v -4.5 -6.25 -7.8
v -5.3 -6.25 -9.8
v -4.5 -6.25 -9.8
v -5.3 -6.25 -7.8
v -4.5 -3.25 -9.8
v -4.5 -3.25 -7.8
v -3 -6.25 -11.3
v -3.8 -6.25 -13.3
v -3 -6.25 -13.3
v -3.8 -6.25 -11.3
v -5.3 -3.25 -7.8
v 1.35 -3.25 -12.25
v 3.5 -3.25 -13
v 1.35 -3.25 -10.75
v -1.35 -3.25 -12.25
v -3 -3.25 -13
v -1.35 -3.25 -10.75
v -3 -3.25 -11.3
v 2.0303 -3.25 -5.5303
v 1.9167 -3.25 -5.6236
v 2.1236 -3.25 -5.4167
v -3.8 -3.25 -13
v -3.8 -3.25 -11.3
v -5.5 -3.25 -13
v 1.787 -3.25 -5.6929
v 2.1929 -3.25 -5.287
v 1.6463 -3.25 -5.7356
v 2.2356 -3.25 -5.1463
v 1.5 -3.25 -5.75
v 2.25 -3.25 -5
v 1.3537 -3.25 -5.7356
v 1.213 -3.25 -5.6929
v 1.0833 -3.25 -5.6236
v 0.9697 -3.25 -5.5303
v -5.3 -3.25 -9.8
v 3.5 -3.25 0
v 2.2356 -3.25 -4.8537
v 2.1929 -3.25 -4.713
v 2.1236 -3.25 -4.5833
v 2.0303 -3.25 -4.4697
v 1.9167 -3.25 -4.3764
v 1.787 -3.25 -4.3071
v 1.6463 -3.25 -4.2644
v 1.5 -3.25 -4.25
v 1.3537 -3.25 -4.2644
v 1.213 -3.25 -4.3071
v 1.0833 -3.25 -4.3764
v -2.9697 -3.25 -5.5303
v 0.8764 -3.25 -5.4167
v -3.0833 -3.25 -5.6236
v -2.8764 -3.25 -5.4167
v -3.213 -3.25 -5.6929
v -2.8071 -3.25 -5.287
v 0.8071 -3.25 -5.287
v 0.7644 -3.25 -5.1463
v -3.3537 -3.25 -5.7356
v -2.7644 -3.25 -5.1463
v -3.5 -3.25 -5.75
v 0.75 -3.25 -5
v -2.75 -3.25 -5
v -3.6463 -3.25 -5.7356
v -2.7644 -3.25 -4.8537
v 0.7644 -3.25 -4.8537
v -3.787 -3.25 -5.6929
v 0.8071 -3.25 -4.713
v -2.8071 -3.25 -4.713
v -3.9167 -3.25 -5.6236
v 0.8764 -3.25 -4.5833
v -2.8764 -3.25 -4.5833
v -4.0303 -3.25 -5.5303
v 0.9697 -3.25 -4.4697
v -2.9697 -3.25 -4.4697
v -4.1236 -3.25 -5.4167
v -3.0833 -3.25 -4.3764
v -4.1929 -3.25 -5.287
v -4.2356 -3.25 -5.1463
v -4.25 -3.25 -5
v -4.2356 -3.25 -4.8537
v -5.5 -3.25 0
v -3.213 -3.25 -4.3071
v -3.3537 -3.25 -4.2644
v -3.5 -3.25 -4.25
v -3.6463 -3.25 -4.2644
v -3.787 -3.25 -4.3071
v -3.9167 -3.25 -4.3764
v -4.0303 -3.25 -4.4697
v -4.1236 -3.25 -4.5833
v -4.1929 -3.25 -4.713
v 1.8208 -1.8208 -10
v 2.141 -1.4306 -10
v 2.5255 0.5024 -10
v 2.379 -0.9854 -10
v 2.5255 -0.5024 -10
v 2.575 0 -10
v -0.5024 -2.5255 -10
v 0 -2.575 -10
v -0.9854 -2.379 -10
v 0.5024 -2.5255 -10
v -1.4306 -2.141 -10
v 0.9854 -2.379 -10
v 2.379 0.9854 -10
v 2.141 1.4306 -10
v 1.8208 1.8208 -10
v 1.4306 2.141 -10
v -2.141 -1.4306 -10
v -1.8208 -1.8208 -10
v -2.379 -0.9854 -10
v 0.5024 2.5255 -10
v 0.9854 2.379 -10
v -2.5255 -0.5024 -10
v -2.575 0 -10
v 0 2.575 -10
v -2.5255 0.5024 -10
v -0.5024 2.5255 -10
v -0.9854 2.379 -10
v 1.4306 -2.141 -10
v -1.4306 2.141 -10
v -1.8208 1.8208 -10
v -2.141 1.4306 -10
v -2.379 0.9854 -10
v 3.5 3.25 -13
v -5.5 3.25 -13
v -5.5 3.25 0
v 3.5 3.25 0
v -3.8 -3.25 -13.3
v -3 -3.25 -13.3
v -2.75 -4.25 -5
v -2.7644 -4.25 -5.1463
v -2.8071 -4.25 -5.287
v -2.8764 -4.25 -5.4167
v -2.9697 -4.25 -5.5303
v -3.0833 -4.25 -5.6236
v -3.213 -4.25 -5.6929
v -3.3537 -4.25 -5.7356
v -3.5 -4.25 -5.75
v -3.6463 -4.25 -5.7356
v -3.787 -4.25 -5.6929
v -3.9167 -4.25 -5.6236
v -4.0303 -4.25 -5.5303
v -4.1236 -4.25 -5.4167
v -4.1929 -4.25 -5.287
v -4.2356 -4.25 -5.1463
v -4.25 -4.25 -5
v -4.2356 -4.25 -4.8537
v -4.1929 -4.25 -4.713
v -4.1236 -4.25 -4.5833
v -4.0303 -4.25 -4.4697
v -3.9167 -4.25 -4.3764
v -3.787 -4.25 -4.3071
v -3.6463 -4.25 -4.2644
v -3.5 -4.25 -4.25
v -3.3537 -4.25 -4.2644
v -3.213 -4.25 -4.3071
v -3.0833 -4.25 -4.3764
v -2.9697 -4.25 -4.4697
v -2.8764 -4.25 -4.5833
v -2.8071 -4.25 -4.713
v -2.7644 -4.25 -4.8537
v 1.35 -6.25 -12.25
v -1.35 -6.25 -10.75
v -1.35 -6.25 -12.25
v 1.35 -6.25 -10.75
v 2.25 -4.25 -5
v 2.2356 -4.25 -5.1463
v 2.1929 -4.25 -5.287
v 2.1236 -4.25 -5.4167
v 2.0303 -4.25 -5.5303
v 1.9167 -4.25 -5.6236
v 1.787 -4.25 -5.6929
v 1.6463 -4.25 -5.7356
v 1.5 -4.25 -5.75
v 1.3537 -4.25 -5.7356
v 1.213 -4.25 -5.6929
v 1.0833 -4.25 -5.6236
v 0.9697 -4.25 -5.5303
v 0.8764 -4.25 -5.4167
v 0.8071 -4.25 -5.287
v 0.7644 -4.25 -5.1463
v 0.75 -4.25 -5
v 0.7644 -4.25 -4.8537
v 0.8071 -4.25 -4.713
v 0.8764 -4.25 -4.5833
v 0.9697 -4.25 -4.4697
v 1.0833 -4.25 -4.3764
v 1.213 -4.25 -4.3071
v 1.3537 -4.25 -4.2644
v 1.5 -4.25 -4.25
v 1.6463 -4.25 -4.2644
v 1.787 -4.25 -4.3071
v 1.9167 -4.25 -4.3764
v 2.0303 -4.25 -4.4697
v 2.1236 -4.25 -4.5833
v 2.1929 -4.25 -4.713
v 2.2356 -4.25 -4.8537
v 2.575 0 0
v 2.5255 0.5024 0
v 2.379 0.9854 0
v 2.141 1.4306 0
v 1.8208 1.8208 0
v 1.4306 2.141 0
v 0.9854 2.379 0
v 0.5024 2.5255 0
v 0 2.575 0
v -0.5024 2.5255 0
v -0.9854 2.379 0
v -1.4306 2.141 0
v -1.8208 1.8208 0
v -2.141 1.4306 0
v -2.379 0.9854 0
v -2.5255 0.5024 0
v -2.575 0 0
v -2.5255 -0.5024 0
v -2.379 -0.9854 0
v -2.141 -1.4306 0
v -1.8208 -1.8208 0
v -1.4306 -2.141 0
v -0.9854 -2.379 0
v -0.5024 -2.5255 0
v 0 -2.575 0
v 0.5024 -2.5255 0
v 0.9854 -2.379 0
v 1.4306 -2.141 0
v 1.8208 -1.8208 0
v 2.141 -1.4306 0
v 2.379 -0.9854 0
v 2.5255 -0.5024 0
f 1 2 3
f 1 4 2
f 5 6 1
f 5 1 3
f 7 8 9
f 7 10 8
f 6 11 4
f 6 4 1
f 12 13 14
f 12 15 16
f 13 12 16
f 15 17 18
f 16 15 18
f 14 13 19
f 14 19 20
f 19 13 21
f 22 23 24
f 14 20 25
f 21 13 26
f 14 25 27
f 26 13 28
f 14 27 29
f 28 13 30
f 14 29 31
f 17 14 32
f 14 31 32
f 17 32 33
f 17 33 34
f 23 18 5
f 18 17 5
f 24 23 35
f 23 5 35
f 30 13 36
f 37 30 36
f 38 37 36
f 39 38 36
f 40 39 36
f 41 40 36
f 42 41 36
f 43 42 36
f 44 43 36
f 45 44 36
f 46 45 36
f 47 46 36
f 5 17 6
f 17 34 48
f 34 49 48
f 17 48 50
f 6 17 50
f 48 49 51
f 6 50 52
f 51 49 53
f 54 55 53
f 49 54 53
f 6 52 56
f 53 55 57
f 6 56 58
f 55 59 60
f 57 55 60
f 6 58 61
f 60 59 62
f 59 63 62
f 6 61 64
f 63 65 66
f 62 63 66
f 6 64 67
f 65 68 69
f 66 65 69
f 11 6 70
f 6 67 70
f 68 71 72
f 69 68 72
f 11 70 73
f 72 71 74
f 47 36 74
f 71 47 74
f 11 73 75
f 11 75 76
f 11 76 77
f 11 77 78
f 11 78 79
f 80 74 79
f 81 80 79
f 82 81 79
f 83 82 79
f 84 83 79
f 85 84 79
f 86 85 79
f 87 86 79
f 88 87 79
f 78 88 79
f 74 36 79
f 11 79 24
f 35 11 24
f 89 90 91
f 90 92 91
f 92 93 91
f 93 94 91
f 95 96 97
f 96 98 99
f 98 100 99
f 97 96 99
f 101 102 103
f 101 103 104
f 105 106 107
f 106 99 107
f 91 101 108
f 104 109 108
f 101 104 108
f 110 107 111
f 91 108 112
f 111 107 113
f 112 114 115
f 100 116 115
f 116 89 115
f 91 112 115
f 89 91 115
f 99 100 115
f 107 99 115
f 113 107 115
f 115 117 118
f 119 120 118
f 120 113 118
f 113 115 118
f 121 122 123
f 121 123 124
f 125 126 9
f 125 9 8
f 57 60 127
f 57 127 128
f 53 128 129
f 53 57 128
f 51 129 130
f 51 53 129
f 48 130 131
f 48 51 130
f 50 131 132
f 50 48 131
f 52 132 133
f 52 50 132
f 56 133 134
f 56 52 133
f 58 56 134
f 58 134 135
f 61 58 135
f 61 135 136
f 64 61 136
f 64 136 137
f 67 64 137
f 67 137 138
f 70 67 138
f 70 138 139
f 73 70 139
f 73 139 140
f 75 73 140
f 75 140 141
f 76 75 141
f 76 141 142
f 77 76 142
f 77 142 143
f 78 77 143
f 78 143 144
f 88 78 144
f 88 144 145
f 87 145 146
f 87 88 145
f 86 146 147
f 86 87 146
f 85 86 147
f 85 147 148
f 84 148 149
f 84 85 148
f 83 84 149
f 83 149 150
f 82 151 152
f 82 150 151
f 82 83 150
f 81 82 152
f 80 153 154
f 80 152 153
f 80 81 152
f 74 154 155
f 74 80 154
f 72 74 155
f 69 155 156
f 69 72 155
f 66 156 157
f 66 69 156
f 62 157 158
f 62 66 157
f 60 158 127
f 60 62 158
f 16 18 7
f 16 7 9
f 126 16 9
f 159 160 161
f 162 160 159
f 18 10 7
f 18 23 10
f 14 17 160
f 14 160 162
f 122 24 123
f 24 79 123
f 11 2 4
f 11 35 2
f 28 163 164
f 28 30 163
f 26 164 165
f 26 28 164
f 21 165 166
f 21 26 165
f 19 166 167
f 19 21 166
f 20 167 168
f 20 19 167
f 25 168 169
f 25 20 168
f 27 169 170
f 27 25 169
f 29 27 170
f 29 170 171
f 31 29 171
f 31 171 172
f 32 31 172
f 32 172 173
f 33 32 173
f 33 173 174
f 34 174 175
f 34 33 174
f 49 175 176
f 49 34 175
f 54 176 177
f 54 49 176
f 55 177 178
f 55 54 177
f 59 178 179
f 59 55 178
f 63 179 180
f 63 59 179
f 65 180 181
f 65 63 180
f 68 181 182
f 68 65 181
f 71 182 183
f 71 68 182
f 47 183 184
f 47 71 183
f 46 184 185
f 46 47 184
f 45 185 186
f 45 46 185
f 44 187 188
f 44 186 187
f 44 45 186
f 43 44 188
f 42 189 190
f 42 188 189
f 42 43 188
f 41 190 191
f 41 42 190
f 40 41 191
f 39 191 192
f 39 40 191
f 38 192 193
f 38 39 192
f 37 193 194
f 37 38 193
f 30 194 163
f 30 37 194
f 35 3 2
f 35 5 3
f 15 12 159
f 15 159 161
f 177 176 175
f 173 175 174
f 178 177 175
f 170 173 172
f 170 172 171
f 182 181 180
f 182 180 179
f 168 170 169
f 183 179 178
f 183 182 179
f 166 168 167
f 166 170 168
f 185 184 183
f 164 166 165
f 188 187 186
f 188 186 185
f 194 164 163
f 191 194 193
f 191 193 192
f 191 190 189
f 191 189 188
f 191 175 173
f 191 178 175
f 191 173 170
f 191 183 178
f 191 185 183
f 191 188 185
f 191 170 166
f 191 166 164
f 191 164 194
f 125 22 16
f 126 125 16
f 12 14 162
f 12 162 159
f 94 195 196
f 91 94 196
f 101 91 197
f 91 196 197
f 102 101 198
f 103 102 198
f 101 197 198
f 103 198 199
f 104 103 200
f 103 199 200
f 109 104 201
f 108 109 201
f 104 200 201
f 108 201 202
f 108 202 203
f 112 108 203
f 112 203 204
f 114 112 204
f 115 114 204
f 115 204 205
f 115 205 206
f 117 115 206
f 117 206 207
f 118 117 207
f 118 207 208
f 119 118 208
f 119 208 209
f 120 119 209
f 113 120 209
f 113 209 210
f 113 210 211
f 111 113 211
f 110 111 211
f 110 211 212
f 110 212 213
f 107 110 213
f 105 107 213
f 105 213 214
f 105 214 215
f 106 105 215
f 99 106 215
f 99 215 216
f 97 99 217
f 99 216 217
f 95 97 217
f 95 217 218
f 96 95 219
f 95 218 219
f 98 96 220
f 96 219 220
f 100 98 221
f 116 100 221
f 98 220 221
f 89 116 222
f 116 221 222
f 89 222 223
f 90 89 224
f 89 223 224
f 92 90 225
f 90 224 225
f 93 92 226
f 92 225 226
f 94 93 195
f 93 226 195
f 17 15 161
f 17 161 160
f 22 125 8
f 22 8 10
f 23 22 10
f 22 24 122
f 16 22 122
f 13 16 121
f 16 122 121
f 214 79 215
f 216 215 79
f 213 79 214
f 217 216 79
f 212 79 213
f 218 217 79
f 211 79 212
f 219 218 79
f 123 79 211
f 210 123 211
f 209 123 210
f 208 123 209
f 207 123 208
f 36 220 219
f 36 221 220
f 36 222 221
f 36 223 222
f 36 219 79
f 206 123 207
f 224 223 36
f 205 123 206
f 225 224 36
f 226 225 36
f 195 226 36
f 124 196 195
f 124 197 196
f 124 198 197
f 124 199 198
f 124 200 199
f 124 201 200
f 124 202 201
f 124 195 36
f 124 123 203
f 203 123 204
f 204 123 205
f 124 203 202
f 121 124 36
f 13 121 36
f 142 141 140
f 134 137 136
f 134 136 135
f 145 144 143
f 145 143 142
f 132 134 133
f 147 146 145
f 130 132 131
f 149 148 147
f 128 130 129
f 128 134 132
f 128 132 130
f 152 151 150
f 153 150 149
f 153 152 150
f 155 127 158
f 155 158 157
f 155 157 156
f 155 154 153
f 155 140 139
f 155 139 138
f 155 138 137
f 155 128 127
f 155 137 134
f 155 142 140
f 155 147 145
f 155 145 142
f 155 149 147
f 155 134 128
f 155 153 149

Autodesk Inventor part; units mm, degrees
ref_plane "YZ Plane" through (0, 0, 0) normal (1, 0, 0) x (0, 1, 0)
ref_plane "XZ Plane" through (0, 0, 0) normal (0, 1, 0) x (-1, 0, 0)
ref_plane "XY Plane" through (0, 0, 0) normal (0, 0, 1) x (1, 0, 0)
sketch "スケッチ1" plane through (0, 0, 0) normal (0, 0, 1) x (1, 0, 0)
  line L0 (-5.5, 3.25) -> (3.5, 3.25)
  line L1 (3.5, 3.25) -> (3.5, -3.25)
  line L2 (3.5, -3.25) -> (-5.5, -3.25)
  line L3 (-5.5, -3.25) -> (-5.5, 3.25)
  line L4 (-5.5, 3.25) -> (3.5, -3.25) construction
  line L5 (3.5, 3.25) -> (-5.5, -3.25) construction
  circle A0 centre (0, 0) radius 2.575
  point P0 (-1, 0)
  point P1 (-1, 0)
  dimension "d0" = 5.15
  dimension "d1" = 9
  dimension "d2" = 3.5
  dimension "d3" = 6.5
extrude "押し出し1" add sketch "スケッチ1" against normal blind 13
sketch "スケッチ2" plane through (-5.5, -3.25, 0) normal (0, -1, 0) x (1, 0, 0)
  circle A0 centre (7, -5) radius 0.75
  circle A1 centre (2, -5) radius 0.75
  line L0 (9, 0) -> (0, 0) projected
  point P0 (5.5, 0)
  dimension "d6" = 1.5
  dimension "d7" = 5
  dimension "d8" = 1.5
  dimension "d9" = 3.5
extrude "押し出し2" add sketch "スケッチ2" along normal blind 1
sketch "スケッチ3" plane through (-5.5, -3.25, 0) normal (0, -1, 0) x (1, 0, 0)
  line L0 (4.15, -10.75) -> (6.85, -10.75)
  line L1 (6.85, -10.75) -> (6.85, -12.25)
  line L2 (6.85, -12.25) -> (4.15, -12.25)
  line L3 (4.15, -12.25) -> (4.15, -10.75)
  line L4 (4.15, -10.75) -> (6.85, -12.25) construction
  line L5 (6.85, -10.75) -> (4.15, -12.25) construction
  circle A0 centre (7, -5) radius 0.75 projected
  line L6 (1.7, -11.3) -> (2.5, -11.3)
  line L7 (2.5, -11.3) -> (2.5, -13.3)
  line L8 (2.5, -13.3) -> (1.7, -13.3)
  line L9 (1.7, -13.3) -> (1.7, -11.3)
  line L10 (1.7, -11.3) -> (2.5, -13.3) construction
  line L11 (2.5, -11.3) -> (1.7, -13.3) construction
  line L12 (0.2, -7.8) -> (1, -7.8)
  line L13 (1, -7.8) -> (1, -9.8)
  line L14 (1, -9.8) -> (0.2, -9.8)
  line L15 (0.2, -9.8) -> (0.2, -7.8)
  line L16 (0.2, -7.8) -> (1, -9.8) construction
  line L17 (1, -7.8) -> (0.2, -9.8) construction
  circle A1 centre (2, -5) radius 0.75 projected
  point P0 (5.5, 0)
  point P1 (5.5, -11.5)
  point P2 (5.5, -11.5)
  point P3 (2.1, -12.3)
  point P4 (0.6, -8.8)
  dimension "d12" = 1.5
  dimension "d13" = 2.7
  dimension "d15" = 6.5
  dimension "d16" = 0.8
  dimension "d17" = 2
  dimension "d18" = 4.9
  dimension "d19" = 3.8
  dimension "d20" = 3.4
  dimension "d21" = 7.3
extrude "押し出し3" add sketch "スケッチ3" along normal blind 3 contours L0 L1 L2 L3 | L6 L7 L8 L9 | L12 L13 L14 L15
sketch "スケッチ4" plane through (0, 0, -13) normal (0, 0, -1) x (-1, 0, 0)
  line L0 (-3.5, 3.25) -> (-3.5, -3.25) projected
  line L1 (5.5, -3.25) -> (5.5, 3.25) projected
  line L2 (-3.5, 3.25) -> (5.5, 3.25)
  line L3 (5.5, 3.25) -> (5.5, -3.25)
  line L4 (5.5, -3.25) -> (-3.5, -3.25)
  line L5 (-3.5, -3.25) -> (-3.5, 3.25)
  point P0 (0, 0)
extrude "押し出し4" add sketch "スケッチ4" against normal blind 3
properties part number "Circuit_HEC3110-01-010"
